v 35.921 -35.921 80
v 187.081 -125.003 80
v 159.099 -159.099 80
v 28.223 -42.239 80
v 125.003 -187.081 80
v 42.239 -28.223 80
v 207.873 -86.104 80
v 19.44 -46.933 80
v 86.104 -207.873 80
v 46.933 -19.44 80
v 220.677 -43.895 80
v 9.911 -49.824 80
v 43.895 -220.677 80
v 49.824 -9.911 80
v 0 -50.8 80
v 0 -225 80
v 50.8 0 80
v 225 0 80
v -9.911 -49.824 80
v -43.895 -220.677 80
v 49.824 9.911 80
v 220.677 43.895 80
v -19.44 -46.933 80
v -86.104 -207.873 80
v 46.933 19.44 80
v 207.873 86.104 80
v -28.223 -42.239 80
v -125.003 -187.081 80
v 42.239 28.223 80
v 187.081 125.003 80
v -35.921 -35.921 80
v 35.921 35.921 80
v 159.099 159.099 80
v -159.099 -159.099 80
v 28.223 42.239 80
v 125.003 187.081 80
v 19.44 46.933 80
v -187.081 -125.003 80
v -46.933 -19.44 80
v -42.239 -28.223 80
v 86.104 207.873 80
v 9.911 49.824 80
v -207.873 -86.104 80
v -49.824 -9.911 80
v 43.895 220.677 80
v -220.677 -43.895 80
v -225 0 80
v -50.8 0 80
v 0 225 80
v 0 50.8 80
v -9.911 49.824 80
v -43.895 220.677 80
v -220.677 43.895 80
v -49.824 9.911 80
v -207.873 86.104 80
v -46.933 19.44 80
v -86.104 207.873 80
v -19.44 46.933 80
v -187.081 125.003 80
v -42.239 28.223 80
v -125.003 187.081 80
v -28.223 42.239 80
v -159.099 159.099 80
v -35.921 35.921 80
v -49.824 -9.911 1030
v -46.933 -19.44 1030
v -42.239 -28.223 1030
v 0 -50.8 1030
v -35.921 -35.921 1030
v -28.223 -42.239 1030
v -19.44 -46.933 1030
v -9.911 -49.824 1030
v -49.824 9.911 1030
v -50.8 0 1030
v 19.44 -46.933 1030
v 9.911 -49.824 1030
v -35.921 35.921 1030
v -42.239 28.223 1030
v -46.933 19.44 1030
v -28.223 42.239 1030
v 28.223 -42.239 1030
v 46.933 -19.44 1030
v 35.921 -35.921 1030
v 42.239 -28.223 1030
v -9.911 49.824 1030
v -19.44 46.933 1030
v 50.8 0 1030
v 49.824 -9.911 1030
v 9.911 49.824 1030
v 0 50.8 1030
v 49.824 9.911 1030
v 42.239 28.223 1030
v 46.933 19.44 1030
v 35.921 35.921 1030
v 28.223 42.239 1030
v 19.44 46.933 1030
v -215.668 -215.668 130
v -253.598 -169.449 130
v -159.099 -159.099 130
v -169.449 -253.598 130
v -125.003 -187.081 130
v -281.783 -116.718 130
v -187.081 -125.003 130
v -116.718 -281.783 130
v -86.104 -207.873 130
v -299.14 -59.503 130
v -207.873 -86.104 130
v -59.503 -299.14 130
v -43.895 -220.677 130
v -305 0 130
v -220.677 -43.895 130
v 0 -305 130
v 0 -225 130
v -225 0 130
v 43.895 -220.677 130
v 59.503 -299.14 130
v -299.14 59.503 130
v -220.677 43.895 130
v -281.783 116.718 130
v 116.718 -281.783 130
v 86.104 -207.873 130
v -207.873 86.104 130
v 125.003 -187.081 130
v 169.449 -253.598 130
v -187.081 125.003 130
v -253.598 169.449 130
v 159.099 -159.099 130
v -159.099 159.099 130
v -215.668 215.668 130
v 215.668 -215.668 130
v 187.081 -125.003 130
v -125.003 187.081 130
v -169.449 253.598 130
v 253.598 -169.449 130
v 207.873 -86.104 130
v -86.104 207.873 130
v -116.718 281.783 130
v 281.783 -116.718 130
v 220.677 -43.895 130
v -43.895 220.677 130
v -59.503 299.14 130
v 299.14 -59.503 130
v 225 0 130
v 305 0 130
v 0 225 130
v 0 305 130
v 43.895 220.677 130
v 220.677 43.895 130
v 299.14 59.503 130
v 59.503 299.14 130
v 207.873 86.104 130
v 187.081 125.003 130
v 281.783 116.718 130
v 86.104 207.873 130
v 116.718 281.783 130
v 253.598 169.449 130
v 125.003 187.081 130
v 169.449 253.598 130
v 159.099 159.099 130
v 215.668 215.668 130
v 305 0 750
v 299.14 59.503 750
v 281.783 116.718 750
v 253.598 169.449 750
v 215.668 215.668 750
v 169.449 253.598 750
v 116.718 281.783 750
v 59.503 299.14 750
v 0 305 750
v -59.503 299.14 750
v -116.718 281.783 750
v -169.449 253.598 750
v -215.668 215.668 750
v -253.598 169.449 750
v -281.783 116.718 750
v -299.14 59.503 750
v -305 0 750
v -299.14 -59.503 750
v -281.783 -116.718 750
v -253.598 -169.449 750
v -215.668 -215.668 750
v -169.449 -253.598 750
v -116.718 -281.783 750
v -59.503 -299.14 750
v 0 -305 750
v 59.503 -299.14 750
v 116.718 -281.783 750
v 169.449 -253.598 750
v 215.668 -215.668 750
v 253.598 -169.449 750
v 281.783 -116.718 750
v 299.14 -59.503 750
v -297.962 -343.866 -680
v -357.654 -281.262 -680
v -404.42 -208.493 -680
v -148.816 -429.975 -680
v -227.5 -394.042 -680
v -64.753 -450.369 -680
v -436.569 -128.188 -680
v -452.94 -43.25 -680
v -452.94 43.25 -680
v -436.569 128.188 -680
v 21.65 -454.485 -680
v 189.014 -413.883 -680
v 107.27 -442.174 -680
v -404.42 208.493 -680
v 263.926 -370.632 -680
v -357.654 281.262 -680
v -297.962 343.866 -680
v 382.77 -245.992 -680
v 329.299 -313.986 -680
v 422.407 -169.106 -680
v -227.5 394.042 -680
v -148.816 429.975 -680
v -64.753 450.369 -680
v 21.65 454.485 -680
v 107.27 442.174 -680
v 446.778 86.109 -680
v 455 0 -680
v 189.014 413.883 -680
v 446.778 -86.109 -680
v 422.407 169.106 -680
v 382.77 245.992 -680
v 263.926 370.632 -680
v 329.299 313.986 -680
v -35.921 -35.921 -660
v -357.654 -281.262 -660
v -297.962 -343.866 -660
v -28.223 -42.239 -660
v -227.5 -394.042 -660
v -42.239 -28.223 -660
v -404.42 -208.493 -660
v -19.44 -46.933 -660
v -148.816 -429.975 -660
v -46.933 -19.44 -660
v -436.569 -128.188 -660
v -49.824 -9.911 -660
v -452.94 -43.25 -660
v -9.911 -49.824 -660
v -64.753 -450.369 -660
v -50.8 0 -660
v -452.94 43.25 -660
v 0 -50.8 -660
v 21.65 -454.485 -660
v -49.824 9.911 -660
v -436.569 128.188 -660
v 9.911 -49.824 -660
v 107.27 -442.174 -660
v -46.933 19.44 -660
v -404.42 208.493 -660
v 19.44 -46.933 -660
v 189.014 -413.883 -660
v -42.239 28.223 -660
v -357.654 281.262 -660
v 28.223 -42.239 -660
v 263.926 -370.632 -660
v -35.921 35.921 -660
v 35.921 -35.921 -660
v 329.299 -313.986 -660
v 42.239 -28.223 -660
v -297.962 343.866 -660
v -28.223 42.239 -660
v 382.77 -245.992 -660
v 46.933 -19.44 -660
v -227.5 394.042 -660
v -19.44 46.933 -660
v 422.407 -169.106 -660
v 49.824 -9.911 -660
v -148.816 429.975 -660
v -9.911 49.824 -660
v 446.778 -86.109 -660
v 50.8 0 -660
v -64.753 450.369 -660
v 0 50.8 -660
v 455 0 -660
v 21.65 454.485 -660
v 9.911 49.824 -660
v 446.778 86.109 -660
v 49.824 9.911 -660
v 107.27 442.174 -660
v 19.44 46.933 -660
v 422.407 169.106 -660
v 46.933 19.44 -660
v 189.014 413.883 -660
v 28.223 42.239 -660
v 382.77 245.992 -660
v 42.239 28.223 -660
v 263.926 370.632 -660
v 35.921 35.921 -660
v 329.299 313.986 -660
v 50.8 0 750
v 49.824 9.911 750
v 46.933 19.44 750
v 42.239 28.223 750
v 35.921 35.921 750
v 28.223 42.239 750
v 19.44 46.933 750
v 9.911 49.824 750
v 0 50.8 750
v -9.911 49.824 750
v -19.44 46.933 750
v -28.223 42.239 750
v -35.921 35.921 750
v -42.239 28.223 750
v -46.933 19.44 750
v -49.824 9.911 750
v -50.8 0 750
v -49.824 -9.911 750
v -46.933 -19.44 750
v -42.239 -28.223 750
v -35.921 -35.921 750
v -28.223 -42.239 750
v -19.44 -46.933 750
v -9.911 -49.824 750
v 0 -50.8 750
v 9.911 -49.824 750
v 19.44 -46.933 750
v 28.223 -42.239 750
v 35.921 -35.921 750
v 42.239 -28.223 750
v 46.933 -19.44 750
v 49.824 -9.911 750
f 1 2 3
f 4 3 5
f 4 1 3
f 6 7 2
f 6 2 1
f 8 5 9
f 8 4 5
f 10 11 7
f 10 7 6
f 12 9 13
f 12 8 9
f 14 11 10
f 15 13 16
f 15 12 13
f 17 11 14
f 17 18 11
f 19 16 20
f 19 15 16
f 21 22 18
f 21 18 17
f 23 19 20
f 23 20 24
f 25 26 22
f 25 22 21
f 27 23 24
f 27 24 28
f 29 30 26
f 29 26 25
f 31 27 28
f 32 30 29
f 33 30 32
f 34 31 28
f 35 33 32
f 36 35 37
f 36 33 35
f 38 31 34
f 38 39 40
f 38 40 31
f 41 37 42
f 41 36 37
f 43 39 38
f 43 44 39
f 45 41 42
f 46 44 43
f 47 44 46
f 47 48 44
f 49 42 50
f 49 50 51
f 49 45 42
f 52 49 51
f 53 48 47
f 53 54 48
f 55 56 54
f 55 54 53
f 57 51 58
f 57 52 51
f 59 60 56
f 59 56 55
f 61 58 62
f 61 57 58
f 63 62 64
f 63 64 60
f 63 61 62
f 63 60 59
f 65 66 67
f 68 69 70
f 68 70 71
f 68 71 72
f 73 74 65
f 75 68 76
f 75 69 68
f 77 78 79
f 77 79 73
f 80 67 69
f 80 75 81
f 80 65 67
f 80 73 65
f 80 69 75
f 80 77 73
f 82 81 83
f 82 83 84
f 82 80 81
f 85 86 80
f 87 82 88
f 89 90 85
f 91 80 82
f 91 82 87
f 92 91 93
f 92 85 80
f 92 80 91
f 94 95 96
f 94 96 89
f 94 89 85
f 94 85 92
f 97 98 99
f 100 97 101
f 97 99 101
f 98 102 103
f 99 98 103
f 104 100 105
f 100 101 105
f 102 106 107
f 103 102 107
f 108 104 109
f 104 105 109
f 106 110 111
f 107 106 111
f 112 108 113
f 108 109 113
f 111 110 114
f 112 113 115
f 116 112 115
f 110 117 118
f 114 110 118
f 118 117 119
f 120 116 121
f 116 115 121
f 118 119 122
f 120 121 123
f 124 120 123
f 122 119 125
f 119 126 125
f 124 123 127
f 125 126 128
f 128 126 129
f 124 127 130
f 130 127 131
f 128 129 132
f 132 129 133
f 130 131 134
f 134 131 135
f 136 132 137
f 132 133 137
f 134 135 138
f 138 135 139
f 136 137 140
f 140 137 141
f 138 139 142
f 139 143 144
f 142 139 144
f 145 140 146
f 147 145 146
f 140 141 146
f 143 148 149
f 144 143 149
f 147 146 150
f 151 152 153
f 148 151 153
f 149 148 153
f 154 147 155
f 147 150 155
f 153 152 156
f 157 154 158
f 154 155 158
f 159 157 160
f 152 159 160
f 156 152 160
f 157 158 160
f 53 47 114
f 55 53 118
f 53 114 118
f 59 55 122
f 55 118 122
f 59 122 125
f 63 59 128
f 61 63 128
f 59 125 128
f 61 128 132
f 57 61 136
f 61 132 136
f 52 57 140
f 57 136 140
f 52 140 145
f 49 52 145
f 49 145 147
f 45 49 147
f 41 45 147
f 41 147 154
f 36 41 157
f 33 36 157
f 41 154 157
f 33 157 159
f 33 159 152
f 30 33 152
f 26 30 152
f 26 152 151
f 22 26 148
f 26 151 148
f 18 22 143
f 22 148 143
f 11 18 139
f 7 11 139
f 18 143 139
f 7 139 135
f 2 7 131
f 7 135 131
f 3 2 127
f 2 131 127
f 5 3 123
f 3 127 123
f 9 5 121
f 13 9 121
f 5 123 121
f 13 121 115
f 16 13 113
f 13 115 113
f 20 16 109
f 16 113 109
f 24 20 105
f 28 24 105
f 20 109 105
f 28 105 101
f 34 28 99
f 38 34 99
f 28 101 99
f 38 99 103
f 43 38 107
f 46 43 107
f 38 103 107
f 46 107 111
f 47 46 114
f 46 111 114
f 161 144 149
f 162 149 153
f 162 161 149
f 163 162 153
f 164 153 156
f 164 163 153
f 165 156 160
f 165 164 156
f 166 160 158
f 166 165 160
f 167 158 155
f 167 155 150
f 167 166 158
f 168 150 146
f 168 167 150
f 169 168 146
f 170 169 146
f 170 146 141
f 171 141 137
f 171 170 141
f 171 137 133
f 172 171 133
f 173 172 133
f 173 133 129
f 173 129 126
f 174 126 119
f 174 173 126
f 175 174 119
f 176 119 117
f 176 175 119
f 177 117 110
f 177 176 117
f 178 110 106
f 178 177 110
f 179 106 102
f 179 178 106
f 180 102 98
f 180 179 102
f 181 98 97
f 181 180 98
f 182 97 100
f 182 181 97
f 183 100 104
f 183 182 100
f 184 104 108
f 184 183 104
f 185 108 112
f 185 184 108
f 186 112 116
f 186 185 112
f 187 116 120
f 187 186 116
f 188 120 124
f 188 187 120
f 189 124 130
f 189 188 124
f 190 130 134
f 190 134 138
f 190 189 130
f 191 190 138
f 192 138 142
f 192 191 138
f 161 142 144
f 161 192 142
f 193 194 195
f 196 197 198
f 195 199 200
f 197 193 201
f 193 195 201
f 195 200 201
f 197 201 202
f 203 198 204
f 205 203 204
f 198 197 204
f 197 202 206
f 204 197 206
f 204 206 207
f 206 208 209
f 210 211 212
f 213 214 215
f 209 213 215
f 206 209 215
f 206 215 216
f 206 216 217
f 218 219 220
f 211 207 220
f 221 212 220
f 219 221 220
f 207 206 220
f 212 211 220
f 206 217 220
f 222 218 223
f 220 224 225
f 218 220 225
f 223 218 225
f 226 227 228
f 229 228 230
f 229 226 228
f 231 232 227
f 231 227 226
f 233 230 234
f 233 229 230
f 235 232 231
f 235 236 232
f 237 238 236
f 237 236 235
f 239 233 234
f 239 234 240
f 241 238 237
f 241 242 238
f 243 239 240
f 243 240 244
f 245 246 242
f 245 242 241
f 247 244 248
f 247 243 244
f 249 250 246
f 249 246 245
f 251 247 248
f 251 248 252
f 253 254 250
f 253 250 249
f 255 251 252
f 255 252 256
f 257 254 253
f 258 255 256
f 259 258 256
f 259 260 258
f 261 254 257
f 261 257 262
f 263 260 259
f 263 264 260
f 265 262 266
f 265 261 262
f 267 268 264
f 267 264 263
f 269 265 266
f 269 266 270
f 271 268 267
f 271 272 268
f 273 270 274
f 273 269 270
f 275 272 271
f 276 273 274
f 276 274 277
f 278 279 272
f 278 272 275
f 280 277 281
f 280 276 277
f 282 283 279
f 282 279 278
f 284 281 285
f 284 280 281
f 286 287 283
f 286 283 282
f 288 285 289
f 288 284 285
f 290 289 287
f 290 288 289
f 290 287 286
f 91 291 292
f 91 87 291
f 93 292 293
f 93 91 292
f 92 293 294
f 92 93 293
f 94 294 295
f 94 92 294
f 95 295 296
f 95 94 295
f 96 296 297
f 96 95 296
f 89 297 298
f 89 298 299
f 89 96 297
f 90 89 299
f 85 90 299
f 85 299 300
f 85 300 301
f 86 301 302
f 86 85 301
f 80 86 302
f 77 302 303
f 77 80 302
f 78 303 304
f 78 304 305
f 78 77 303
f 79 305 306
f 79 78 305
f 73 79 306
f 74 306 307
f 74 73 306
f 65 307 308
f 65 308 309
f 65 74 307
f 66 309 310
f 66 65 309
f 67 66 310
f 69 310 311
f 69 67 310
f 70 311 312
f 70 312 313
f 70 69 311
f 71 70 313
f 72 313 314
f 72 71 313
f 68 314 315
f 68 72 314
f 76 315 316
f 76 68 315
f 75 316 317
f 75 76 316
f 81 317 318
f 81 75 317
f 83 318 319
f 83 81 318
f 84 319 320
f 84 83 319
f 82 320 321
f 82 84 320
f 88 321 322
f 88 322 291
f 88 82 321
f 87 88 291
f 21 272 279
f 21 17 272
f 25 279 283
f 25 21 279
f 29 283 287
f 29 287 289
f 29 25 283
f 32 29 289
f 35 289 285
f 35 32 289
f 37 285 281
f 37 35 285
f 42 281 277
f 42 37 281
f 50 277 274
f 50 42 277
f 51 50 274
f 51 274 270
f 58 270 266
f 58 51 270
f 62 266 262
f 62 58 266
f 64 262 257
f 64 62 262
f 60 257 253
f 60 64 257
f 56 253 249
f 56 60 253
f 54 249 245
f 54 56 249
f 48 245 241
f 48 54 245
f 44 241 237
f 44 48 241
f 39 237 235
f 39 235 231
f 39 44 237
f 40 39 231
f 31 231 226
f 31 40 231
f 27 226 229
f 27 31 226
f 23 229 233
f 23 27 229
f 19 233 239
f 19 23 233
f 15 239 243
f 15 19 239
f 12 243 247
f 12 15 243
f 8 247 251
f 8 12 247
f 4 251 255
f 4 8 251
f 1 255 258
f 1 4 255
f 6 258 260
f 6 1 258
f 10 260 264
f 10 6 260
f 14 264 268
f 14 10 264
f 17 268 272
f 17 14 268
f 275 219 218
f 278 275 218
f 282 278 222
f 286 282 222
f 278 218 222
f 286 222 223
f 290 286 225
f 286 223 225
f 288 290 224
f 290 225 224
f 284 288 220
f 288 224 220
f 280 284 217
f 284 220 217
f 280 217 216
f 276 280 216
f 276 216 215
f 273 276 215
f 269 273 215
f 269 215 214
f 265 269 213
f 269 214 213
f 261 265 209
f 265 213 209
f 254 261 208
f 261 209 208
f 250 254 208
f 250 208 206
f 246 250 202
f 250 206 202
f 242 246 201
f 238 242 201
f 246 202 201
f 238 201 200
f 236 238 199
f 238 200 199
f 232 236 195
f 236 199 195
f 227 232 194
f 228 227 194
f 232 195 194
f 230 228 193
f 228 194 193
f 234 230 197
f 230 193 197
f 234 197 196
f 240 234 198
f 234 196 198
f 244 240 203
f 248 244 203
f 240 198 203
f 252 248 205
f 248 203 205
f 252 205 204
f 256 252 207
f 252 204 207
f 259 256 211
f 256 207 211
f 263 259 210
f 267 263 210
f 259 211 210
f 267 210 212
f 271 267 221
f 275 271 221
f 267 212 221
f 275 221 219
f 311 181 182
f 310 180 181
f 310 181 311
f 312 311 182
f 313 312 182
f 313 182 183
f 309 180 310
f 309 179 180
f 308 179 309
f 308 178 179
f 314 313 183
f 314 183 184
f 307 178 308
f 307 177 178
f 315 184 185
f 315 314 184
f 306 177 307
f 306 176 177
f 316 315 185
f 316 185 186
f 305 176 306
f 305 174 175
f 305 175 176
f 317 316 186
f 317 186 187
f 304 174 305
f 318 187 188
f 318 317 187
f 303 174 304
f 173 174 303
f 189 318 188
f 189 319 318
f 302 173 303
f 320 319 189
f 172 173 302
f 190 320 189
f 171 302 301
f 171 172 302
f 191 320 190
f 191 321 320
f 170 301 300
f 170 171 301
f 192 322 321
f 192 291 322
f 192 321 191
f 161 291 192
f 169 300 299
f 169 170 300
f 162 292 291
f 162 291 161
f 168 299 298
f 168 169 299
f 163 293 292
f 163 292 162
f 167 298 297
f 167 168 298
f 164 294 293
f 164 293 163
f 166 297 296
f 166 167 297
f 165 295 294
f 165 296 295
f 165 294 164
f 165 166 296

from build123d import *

# Parameters (mm, degrees)
SKETCH1_R                = 50.8
BOSS_EXTRUDE1_DEPTH      = 1030
BOSS_EXTRUDE1_DEPTH_BACK = 680
SKETCH2_R                = 455
BOSS_EXTRUDE2_DEPTH      = 20
BOSS_EXTRUDE3_START      = -280
SKETCH7_R                = 305
BOSS_EXTRUDE3_DEPTH      = 620
SKETCH8_R                = 225
BOSS_EXTRUDE4_DEPTH      = 50


with BuildPart() as part:
    # Sketch1 → Boss-Extrude1 (new body, two sides)
    with BuildSketch(Plane.XY) as boss_extrude1_sk:
        Circle(SKETCH1_R)
    extrude(amount=BOSS_EXTRUDE1_DEPTH)
    extrude(boss_extrude1_sk.sketch, amount=-BOSS_EXTRUDE1_DEPTH_BACK)

    # Sketch2 → Boss-Extrude2 (add)
    with BuildSketch(Plane.XY.offset(-680)):
        Circle(SKETCH2_R)
    extrude(amount=BOSS_EXTRUDE2_DEPTH)

    # Sketch7 → Boss-Extrude3 (add)
    with BuildSketch(Plane.XY.offset(1030).offset(BOSS_EXTRUDE3_START)):
        Circle(SKETCH7_R)
    extrude(amount=-BOSS_EXTRUDE3_DEPTH)

    # Sketch8 → Boss-Extrude4 (add)
    with BuildSketch(Plane(origin=(0, 0, 130), x_dir=(-1, 0, 0), z_dir=(0, 0, -1))):
        Circle(SKETCH8_R)
    extrude(amount=BOSS_EXTRUDE4_DEPTH)


solid = part.part
